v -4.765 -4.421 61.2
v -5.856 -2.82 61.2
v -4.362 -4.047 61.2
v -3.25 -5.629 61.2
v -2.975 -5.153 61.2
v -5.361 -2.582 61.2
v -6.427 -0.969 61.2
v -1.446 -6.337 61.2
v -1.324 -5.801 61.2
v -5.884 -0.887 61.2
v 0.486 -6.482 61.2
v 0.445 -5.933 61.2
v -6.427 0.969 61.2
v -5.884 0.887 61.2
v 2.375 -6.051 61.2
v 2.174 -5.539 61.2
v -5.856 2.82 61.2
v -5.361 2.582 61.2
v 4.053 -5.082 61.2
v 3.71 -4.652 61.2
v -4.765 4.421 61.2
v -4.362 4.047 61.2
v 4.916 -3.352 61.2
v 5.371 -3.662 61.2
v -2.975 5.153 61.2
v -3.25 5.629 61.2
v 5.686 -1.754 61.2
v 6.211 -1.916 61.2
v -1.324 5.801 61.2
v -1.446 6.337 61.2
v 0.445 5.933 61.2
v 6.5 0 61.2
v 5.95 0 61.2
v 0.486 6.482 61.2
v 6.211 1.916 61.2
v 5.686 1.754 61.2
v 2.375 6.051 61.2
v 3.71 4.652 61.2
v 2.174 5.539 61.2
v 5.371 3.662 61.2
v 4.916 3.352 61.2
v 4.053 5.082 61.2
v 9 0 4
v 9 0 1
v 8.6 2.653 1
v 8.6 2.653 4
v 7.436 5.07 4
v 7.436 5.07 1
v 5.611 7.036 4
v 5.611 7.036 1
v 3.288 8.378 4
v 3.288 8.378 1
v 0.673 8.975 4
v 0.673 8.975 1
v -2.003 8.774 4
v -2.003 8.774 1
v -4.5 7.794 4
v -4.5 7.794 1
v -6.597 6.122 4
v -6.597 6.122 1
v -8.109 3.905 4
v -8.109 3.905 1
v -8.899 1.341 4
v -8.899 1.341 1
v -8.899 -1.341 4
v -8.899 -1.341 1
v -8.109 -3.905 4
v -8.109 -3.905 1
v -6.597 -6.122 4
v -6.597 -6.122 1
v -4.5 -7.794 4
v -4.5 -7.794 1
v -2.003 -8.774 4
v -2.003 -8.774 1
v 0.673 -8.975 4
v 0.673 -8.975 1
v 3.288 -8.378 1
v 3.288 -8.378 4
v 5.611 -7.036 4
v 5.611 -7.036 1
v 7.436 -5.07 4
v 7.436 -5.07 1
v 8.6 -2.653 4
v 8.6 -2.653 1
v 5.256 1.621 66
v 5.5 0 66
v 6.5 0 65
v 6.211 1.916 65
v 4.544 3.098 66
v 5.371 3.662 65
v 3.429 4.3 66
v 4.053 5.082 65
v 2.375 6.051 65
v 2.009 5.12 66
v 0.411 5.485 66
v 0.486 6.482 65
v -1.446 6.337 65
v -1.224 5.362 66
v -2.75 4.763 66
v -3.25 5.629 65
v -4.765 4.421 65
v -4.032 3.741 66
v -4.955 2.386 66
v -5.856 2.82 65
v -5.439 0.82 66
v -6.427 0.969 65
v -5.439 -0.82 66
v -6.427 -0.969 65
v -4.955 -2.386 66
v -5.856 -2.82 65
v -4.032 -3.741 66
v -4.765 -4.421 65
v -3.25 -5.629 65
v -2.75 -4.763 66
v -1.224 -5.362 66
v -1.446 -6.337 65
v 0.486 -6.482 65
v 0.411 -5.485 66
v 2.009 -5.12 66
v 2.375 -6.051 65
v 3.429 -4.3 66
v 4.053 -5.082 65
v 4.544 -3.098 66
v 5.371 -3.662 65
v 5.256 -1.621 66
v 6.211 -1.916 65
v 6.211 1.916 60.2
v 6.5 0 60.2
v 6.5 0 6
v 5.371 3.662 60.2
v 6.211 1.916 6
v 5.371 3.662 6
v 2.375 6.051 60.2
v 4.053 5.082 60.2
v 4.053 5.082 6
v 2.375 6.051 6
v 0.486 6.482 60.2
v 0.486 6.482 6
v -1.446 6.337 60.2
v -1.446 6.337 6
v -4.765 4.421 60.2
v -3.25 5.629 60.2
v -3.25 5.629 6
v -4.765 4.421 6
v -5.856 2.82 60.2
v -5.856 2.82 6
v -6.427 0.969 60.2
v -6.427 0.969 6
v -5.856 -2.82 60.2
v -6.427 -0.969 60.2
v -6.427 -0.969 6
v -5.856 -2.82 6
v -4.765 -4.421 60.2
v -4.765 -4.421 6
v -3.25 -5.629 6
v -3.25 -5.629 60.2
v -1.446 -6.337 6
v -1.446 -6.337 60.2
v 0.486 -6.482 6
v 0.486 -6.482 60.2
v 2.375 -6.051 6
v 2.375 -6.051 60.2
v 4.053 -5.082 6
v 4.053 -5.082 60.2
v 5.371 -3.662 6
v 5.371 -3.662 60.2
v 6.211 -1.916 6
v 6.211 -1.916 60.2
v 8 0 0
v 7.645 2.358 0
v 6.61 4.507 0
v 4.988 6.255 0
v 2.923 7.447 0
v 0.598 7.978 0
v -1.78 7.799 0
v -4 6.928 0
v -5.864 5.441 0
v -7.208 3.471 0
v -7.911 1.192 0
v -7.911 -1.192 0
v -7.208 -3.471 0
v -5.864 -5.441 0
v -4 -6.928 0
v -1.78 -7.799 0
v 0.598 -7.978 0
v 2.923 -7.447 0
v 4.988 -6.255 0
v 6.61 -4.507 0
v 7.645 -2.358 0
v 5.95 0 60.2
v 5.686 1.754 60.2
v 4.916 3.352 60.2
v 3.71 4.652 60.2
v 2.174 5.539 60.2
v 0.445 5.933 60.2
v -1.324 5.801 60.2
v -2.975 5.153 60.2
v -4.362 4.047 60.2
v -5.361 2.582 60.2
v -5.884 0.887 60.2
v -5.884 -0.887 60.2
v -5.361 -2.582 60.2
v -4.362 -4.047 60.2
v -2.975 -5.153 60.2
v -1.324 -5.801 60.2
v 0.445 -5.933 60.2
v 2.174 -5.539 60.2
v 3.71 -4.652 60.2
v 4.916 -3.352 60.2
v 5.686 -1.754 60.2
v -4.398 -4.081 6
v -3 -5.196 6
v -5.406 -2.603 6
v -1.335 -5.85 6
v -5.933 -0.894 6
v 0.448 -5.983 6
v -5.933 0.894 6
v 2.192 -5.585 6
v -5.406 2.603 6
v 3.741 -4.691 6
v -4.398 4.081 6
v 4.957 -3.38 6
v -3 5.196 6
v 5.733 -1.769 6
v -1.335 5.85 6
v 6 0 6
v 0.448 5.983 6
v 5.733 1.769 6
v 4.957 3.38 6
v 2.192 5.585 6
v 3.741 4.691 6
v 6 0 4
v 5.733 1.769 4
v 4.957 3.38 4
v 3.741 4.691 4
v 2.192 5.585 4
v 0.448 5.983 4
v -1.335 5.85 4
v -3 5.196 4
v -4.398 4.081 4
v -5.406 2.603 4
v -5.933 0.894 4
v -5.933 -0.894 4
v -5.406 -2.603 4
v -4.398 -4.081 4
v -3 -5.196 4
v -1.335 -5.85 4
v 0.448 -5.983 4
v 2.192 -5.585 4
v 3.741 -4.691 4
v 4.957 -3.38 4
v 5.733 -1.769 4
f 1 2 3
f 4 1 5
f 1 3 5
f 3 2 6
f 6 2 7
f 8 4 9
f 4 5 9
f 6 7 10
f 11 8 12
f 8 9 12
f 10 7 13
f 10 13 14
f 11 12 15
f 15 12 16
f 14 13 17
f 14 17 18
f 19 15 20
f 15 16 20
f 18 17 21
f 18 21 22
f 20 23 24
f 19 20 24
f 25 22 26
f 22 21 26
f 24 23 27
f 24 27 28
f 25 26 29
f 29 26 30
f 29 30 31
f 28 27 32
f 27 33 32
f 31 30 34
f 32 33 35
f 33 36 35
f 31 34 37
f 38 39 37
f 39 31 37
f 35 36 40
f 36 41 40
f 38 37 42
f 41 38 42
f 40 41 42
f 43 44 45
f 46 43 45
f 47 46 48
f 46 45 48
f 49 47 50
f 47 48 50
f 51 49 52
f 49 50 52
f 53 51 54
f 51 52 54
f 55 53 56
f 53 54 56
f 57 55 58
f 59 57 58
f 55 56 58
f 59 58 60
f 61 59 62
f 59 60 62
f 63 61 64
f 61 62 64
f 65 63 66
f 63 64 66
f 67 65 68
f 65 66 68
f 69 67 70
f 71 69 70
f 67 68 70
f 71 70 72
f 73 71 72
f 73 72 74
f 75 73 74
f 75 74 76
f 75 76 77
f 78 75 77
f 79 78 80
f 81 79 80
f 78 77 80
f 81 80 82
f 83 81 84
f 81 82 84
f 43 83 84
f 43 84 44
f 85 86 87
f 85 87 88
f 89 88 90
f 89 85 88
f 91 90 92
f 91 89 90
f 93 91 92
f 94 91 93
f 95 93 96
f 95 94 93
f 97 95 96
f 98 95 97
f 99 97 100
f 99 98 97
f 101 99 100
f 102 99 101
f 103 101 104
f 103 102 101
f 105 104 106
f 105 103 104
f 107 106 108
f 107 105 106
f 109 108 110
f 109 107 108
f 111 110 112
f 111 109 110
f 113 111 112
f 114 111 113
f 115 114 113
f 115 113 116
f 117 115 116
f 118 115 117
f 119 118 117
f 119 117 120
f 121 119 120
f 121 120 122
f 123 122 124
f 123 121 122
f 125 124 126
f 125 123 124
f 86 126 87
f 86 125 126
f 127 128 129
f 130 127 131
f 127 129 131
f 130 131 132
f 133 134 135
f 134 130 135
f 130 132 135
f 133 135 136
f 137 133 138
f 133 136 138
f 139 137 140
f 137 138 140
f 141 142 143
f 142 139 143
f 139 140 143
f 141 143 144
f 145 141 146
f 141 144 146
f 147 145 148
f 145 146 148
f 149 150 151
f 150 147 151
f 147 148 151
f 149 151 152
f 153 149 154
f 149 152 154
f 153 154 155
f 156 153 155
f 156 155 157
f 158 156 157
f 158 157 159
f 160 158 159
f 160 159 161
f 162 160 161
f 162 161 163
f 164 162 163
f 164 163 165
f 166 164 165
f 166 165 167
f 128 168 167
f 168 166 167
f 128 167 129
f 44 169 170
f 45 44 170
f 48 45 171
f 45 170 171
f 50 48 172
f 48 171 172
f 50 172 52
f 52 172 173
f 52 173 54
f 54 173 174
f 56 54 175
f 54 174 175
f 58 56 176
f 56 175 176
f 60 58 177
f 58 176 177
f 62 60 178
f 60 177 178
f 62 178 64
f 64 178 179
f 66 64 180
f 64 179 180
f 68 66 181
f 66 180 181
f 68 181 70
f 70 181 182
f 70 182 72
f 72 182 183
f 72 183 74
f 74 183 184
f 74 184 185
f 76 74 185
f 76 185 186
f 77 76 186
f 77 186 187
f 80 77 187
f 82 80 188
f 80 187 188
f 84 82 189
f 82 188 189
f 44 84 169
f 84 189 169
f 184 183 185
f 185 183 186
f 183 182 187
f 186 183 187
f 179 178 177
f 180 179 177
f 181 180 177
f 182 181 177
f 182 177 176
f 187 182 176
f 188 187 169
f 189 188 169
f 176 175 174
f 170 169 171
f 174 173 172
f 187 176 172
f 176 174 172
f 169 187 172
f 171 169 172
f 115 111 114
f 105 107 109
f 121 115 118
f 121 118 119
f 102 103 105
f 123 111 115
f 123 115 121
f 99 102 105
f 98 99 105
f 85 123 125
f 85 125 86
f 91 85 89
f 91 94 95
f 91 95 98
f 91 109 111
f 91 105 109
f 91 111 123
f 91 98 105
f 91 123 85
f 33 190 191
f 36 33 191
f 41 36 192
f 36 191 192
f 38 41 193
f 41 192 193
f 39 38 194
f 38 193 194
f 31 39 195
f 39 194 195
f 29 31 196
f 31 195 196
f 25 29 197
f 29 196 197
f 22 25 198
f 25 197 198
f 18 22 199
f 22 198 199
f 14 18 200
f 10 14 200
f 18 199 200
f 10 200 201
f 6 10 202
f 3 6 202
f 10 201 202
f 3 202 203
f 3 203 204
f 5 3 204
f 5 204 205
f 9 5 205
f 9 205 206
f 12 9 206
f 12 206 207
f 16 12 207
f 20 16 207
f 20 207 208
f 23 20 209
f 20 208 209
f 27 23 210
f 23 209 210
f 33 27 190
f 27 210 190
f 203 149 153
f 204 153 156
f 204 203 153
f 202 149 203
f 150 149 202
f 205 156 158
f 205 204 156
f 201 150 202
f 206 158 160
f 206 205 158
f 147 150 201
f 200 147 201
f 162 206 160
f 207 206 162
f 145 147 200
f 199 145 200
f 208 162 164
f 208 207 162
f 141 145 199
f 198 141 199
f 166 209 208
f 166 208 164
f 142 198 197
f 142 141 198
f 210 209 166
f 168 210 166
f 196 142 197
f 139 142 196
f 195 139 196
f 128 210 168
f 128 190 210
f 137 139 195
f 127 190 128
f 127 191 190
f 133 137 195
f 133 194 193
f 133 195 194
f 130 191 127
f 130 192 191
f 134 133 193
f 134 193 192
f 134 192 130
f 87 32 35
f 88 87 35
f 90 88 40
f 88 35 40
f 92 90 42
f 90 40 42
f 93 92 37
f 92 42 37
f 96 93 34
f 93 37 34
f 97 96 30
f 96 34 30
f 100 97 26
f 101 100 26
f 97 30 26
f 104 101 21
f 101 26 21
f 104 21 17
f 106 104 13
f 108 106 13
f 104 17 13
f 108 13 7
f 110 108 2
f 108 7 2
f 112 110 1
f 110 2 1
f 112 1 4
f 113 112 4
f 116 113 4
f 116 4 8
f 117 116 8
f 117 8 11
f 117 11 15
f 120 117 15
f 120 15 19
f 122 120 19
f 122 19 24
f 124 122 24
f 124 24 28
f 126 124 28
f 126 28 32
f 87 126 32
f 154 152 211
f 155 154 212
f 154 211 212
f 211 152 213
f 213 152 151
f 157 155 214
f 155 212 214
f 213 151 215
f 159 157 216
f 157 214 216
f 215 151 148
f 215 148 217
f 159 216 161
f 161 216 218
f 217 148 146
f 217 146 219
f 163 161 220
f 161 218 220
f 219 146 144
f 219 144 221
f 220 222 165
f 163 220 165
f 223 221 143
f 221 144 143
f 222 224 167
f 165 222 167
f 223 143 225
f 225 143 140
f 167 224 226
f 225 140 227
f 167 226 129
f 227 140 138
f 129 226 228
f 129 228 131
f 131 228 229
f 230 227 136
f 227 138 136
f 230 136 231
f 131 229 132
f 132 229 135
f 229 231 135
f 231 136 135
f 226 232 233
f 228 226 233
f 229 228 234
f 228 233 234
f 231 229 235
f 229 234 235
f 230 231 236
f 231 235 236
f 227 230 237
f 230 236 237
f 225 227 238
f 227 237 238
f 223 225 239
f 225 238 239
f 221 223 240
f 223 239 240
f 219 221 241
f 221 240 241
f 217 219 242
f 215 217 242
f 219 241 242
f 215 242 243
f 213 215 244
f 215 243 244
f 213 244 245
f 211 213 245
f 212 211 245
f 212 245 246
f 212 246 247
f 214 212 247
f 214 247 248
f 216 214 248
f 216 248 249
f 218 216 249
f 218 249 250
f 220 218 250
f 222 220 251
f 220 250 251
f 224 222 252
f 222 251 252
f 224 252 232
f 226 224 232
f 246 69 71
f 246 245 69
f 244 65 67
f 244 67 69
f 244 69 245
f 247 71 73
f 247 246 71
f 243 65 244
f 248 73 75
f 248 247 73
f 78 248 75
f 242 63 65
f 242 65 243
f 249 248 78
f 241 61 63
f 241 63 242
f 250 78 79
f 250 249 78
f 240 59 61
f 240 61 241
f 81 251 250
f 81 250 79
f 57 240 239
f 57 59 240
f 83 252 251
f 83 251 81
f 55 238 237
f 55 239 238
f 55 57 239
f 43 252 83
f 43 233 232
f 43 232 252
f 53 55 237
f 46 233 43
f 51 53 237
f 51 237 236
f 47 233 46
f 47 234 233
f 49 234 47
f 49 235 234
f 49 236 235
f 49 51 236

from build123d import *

# Parameters (mm, degrees)
SKETCH_1_R          = 9
EXTRUDE_1_DEPTH     = 4
SKETCH_2_R          = 6.5
EXTRUDE_2_DEPTH     = 62
SKETCH_4_OUTSIDE_W  = 34.148
SKETCH_4_OUTSIDE_H  = 34.148
SKETCH_4_OUTSIDE_R  = 6
CUT_EXTRUDE_1_DEPTH = 2
CUT_EXTRUDE_START   = -5.8
SKETCH_5_OUTSIDE_W  = 34.148
SKETCH_5_OUTSIDE_H  = 34.148
SKETCH_5_OUTSIDE_R  = 5.95
CUT_EXTRUDE_2_DEPTH = 1
CHAMFER_1_SIZE      = 1


with BuildPart() as part:
    # 草图1 → 凸台-拉伸1 (new body)
    with BuildSketch(Plane.XY):
        Circle(SKETCH_1_R)
    extrude(amount=EXTRUDE_1_DEPTH)

    # 草图2 → 凸台-拉伸2 (add)
    with BuildSketch(Plane.XY.offset(4)):
        Circle(SKETCH_2_R)
    extrude(amount=EXTRUDE_2_DEPTH)

    # 草图4 outside → 切除-拉伸1 (cut)
    with BuildSketch(Plane.XY.offset(4)):
        Rectangle(SKETCH_4_OUTSIDE_W, SKETCH_4_OUTSIDE_H)
        Circle(SKETCH_4_OUTSIDE_R, mode=Mode.SUBTRACT)
    extrude(amount=CUT_EXTRUDE_1_DEPTH, mode=Mode.SUBTRACT)

    # 草图5 outside → 切除-拉伸2 (cut)
    with BuildSketch(Plane.XY.offset(66).offset(CUT_EXTRUDE_START)):
        Rectangle(SKETCH_5_OUTSIDE_W, SKETCH_5_OUTSIDE_H)
        Circle(SKETCH_5_OUTSIDE_R, mode=Mode.SUBTRACT)
    extrude(amount=CUT_EXTRUDE_2_DEPTH, mode=Mode.SUBTRACT)

    # 倒角1
    chamfer_1_edges = [part.edges().sort_by_distance(p)[0] for p in [
        (-9, 0, 0),
        (-6.5, 0, 66),
    ]]
    chamfer(chamfer_1_edges, length=CHAMFER_1_SIZE)


solid = part.part
